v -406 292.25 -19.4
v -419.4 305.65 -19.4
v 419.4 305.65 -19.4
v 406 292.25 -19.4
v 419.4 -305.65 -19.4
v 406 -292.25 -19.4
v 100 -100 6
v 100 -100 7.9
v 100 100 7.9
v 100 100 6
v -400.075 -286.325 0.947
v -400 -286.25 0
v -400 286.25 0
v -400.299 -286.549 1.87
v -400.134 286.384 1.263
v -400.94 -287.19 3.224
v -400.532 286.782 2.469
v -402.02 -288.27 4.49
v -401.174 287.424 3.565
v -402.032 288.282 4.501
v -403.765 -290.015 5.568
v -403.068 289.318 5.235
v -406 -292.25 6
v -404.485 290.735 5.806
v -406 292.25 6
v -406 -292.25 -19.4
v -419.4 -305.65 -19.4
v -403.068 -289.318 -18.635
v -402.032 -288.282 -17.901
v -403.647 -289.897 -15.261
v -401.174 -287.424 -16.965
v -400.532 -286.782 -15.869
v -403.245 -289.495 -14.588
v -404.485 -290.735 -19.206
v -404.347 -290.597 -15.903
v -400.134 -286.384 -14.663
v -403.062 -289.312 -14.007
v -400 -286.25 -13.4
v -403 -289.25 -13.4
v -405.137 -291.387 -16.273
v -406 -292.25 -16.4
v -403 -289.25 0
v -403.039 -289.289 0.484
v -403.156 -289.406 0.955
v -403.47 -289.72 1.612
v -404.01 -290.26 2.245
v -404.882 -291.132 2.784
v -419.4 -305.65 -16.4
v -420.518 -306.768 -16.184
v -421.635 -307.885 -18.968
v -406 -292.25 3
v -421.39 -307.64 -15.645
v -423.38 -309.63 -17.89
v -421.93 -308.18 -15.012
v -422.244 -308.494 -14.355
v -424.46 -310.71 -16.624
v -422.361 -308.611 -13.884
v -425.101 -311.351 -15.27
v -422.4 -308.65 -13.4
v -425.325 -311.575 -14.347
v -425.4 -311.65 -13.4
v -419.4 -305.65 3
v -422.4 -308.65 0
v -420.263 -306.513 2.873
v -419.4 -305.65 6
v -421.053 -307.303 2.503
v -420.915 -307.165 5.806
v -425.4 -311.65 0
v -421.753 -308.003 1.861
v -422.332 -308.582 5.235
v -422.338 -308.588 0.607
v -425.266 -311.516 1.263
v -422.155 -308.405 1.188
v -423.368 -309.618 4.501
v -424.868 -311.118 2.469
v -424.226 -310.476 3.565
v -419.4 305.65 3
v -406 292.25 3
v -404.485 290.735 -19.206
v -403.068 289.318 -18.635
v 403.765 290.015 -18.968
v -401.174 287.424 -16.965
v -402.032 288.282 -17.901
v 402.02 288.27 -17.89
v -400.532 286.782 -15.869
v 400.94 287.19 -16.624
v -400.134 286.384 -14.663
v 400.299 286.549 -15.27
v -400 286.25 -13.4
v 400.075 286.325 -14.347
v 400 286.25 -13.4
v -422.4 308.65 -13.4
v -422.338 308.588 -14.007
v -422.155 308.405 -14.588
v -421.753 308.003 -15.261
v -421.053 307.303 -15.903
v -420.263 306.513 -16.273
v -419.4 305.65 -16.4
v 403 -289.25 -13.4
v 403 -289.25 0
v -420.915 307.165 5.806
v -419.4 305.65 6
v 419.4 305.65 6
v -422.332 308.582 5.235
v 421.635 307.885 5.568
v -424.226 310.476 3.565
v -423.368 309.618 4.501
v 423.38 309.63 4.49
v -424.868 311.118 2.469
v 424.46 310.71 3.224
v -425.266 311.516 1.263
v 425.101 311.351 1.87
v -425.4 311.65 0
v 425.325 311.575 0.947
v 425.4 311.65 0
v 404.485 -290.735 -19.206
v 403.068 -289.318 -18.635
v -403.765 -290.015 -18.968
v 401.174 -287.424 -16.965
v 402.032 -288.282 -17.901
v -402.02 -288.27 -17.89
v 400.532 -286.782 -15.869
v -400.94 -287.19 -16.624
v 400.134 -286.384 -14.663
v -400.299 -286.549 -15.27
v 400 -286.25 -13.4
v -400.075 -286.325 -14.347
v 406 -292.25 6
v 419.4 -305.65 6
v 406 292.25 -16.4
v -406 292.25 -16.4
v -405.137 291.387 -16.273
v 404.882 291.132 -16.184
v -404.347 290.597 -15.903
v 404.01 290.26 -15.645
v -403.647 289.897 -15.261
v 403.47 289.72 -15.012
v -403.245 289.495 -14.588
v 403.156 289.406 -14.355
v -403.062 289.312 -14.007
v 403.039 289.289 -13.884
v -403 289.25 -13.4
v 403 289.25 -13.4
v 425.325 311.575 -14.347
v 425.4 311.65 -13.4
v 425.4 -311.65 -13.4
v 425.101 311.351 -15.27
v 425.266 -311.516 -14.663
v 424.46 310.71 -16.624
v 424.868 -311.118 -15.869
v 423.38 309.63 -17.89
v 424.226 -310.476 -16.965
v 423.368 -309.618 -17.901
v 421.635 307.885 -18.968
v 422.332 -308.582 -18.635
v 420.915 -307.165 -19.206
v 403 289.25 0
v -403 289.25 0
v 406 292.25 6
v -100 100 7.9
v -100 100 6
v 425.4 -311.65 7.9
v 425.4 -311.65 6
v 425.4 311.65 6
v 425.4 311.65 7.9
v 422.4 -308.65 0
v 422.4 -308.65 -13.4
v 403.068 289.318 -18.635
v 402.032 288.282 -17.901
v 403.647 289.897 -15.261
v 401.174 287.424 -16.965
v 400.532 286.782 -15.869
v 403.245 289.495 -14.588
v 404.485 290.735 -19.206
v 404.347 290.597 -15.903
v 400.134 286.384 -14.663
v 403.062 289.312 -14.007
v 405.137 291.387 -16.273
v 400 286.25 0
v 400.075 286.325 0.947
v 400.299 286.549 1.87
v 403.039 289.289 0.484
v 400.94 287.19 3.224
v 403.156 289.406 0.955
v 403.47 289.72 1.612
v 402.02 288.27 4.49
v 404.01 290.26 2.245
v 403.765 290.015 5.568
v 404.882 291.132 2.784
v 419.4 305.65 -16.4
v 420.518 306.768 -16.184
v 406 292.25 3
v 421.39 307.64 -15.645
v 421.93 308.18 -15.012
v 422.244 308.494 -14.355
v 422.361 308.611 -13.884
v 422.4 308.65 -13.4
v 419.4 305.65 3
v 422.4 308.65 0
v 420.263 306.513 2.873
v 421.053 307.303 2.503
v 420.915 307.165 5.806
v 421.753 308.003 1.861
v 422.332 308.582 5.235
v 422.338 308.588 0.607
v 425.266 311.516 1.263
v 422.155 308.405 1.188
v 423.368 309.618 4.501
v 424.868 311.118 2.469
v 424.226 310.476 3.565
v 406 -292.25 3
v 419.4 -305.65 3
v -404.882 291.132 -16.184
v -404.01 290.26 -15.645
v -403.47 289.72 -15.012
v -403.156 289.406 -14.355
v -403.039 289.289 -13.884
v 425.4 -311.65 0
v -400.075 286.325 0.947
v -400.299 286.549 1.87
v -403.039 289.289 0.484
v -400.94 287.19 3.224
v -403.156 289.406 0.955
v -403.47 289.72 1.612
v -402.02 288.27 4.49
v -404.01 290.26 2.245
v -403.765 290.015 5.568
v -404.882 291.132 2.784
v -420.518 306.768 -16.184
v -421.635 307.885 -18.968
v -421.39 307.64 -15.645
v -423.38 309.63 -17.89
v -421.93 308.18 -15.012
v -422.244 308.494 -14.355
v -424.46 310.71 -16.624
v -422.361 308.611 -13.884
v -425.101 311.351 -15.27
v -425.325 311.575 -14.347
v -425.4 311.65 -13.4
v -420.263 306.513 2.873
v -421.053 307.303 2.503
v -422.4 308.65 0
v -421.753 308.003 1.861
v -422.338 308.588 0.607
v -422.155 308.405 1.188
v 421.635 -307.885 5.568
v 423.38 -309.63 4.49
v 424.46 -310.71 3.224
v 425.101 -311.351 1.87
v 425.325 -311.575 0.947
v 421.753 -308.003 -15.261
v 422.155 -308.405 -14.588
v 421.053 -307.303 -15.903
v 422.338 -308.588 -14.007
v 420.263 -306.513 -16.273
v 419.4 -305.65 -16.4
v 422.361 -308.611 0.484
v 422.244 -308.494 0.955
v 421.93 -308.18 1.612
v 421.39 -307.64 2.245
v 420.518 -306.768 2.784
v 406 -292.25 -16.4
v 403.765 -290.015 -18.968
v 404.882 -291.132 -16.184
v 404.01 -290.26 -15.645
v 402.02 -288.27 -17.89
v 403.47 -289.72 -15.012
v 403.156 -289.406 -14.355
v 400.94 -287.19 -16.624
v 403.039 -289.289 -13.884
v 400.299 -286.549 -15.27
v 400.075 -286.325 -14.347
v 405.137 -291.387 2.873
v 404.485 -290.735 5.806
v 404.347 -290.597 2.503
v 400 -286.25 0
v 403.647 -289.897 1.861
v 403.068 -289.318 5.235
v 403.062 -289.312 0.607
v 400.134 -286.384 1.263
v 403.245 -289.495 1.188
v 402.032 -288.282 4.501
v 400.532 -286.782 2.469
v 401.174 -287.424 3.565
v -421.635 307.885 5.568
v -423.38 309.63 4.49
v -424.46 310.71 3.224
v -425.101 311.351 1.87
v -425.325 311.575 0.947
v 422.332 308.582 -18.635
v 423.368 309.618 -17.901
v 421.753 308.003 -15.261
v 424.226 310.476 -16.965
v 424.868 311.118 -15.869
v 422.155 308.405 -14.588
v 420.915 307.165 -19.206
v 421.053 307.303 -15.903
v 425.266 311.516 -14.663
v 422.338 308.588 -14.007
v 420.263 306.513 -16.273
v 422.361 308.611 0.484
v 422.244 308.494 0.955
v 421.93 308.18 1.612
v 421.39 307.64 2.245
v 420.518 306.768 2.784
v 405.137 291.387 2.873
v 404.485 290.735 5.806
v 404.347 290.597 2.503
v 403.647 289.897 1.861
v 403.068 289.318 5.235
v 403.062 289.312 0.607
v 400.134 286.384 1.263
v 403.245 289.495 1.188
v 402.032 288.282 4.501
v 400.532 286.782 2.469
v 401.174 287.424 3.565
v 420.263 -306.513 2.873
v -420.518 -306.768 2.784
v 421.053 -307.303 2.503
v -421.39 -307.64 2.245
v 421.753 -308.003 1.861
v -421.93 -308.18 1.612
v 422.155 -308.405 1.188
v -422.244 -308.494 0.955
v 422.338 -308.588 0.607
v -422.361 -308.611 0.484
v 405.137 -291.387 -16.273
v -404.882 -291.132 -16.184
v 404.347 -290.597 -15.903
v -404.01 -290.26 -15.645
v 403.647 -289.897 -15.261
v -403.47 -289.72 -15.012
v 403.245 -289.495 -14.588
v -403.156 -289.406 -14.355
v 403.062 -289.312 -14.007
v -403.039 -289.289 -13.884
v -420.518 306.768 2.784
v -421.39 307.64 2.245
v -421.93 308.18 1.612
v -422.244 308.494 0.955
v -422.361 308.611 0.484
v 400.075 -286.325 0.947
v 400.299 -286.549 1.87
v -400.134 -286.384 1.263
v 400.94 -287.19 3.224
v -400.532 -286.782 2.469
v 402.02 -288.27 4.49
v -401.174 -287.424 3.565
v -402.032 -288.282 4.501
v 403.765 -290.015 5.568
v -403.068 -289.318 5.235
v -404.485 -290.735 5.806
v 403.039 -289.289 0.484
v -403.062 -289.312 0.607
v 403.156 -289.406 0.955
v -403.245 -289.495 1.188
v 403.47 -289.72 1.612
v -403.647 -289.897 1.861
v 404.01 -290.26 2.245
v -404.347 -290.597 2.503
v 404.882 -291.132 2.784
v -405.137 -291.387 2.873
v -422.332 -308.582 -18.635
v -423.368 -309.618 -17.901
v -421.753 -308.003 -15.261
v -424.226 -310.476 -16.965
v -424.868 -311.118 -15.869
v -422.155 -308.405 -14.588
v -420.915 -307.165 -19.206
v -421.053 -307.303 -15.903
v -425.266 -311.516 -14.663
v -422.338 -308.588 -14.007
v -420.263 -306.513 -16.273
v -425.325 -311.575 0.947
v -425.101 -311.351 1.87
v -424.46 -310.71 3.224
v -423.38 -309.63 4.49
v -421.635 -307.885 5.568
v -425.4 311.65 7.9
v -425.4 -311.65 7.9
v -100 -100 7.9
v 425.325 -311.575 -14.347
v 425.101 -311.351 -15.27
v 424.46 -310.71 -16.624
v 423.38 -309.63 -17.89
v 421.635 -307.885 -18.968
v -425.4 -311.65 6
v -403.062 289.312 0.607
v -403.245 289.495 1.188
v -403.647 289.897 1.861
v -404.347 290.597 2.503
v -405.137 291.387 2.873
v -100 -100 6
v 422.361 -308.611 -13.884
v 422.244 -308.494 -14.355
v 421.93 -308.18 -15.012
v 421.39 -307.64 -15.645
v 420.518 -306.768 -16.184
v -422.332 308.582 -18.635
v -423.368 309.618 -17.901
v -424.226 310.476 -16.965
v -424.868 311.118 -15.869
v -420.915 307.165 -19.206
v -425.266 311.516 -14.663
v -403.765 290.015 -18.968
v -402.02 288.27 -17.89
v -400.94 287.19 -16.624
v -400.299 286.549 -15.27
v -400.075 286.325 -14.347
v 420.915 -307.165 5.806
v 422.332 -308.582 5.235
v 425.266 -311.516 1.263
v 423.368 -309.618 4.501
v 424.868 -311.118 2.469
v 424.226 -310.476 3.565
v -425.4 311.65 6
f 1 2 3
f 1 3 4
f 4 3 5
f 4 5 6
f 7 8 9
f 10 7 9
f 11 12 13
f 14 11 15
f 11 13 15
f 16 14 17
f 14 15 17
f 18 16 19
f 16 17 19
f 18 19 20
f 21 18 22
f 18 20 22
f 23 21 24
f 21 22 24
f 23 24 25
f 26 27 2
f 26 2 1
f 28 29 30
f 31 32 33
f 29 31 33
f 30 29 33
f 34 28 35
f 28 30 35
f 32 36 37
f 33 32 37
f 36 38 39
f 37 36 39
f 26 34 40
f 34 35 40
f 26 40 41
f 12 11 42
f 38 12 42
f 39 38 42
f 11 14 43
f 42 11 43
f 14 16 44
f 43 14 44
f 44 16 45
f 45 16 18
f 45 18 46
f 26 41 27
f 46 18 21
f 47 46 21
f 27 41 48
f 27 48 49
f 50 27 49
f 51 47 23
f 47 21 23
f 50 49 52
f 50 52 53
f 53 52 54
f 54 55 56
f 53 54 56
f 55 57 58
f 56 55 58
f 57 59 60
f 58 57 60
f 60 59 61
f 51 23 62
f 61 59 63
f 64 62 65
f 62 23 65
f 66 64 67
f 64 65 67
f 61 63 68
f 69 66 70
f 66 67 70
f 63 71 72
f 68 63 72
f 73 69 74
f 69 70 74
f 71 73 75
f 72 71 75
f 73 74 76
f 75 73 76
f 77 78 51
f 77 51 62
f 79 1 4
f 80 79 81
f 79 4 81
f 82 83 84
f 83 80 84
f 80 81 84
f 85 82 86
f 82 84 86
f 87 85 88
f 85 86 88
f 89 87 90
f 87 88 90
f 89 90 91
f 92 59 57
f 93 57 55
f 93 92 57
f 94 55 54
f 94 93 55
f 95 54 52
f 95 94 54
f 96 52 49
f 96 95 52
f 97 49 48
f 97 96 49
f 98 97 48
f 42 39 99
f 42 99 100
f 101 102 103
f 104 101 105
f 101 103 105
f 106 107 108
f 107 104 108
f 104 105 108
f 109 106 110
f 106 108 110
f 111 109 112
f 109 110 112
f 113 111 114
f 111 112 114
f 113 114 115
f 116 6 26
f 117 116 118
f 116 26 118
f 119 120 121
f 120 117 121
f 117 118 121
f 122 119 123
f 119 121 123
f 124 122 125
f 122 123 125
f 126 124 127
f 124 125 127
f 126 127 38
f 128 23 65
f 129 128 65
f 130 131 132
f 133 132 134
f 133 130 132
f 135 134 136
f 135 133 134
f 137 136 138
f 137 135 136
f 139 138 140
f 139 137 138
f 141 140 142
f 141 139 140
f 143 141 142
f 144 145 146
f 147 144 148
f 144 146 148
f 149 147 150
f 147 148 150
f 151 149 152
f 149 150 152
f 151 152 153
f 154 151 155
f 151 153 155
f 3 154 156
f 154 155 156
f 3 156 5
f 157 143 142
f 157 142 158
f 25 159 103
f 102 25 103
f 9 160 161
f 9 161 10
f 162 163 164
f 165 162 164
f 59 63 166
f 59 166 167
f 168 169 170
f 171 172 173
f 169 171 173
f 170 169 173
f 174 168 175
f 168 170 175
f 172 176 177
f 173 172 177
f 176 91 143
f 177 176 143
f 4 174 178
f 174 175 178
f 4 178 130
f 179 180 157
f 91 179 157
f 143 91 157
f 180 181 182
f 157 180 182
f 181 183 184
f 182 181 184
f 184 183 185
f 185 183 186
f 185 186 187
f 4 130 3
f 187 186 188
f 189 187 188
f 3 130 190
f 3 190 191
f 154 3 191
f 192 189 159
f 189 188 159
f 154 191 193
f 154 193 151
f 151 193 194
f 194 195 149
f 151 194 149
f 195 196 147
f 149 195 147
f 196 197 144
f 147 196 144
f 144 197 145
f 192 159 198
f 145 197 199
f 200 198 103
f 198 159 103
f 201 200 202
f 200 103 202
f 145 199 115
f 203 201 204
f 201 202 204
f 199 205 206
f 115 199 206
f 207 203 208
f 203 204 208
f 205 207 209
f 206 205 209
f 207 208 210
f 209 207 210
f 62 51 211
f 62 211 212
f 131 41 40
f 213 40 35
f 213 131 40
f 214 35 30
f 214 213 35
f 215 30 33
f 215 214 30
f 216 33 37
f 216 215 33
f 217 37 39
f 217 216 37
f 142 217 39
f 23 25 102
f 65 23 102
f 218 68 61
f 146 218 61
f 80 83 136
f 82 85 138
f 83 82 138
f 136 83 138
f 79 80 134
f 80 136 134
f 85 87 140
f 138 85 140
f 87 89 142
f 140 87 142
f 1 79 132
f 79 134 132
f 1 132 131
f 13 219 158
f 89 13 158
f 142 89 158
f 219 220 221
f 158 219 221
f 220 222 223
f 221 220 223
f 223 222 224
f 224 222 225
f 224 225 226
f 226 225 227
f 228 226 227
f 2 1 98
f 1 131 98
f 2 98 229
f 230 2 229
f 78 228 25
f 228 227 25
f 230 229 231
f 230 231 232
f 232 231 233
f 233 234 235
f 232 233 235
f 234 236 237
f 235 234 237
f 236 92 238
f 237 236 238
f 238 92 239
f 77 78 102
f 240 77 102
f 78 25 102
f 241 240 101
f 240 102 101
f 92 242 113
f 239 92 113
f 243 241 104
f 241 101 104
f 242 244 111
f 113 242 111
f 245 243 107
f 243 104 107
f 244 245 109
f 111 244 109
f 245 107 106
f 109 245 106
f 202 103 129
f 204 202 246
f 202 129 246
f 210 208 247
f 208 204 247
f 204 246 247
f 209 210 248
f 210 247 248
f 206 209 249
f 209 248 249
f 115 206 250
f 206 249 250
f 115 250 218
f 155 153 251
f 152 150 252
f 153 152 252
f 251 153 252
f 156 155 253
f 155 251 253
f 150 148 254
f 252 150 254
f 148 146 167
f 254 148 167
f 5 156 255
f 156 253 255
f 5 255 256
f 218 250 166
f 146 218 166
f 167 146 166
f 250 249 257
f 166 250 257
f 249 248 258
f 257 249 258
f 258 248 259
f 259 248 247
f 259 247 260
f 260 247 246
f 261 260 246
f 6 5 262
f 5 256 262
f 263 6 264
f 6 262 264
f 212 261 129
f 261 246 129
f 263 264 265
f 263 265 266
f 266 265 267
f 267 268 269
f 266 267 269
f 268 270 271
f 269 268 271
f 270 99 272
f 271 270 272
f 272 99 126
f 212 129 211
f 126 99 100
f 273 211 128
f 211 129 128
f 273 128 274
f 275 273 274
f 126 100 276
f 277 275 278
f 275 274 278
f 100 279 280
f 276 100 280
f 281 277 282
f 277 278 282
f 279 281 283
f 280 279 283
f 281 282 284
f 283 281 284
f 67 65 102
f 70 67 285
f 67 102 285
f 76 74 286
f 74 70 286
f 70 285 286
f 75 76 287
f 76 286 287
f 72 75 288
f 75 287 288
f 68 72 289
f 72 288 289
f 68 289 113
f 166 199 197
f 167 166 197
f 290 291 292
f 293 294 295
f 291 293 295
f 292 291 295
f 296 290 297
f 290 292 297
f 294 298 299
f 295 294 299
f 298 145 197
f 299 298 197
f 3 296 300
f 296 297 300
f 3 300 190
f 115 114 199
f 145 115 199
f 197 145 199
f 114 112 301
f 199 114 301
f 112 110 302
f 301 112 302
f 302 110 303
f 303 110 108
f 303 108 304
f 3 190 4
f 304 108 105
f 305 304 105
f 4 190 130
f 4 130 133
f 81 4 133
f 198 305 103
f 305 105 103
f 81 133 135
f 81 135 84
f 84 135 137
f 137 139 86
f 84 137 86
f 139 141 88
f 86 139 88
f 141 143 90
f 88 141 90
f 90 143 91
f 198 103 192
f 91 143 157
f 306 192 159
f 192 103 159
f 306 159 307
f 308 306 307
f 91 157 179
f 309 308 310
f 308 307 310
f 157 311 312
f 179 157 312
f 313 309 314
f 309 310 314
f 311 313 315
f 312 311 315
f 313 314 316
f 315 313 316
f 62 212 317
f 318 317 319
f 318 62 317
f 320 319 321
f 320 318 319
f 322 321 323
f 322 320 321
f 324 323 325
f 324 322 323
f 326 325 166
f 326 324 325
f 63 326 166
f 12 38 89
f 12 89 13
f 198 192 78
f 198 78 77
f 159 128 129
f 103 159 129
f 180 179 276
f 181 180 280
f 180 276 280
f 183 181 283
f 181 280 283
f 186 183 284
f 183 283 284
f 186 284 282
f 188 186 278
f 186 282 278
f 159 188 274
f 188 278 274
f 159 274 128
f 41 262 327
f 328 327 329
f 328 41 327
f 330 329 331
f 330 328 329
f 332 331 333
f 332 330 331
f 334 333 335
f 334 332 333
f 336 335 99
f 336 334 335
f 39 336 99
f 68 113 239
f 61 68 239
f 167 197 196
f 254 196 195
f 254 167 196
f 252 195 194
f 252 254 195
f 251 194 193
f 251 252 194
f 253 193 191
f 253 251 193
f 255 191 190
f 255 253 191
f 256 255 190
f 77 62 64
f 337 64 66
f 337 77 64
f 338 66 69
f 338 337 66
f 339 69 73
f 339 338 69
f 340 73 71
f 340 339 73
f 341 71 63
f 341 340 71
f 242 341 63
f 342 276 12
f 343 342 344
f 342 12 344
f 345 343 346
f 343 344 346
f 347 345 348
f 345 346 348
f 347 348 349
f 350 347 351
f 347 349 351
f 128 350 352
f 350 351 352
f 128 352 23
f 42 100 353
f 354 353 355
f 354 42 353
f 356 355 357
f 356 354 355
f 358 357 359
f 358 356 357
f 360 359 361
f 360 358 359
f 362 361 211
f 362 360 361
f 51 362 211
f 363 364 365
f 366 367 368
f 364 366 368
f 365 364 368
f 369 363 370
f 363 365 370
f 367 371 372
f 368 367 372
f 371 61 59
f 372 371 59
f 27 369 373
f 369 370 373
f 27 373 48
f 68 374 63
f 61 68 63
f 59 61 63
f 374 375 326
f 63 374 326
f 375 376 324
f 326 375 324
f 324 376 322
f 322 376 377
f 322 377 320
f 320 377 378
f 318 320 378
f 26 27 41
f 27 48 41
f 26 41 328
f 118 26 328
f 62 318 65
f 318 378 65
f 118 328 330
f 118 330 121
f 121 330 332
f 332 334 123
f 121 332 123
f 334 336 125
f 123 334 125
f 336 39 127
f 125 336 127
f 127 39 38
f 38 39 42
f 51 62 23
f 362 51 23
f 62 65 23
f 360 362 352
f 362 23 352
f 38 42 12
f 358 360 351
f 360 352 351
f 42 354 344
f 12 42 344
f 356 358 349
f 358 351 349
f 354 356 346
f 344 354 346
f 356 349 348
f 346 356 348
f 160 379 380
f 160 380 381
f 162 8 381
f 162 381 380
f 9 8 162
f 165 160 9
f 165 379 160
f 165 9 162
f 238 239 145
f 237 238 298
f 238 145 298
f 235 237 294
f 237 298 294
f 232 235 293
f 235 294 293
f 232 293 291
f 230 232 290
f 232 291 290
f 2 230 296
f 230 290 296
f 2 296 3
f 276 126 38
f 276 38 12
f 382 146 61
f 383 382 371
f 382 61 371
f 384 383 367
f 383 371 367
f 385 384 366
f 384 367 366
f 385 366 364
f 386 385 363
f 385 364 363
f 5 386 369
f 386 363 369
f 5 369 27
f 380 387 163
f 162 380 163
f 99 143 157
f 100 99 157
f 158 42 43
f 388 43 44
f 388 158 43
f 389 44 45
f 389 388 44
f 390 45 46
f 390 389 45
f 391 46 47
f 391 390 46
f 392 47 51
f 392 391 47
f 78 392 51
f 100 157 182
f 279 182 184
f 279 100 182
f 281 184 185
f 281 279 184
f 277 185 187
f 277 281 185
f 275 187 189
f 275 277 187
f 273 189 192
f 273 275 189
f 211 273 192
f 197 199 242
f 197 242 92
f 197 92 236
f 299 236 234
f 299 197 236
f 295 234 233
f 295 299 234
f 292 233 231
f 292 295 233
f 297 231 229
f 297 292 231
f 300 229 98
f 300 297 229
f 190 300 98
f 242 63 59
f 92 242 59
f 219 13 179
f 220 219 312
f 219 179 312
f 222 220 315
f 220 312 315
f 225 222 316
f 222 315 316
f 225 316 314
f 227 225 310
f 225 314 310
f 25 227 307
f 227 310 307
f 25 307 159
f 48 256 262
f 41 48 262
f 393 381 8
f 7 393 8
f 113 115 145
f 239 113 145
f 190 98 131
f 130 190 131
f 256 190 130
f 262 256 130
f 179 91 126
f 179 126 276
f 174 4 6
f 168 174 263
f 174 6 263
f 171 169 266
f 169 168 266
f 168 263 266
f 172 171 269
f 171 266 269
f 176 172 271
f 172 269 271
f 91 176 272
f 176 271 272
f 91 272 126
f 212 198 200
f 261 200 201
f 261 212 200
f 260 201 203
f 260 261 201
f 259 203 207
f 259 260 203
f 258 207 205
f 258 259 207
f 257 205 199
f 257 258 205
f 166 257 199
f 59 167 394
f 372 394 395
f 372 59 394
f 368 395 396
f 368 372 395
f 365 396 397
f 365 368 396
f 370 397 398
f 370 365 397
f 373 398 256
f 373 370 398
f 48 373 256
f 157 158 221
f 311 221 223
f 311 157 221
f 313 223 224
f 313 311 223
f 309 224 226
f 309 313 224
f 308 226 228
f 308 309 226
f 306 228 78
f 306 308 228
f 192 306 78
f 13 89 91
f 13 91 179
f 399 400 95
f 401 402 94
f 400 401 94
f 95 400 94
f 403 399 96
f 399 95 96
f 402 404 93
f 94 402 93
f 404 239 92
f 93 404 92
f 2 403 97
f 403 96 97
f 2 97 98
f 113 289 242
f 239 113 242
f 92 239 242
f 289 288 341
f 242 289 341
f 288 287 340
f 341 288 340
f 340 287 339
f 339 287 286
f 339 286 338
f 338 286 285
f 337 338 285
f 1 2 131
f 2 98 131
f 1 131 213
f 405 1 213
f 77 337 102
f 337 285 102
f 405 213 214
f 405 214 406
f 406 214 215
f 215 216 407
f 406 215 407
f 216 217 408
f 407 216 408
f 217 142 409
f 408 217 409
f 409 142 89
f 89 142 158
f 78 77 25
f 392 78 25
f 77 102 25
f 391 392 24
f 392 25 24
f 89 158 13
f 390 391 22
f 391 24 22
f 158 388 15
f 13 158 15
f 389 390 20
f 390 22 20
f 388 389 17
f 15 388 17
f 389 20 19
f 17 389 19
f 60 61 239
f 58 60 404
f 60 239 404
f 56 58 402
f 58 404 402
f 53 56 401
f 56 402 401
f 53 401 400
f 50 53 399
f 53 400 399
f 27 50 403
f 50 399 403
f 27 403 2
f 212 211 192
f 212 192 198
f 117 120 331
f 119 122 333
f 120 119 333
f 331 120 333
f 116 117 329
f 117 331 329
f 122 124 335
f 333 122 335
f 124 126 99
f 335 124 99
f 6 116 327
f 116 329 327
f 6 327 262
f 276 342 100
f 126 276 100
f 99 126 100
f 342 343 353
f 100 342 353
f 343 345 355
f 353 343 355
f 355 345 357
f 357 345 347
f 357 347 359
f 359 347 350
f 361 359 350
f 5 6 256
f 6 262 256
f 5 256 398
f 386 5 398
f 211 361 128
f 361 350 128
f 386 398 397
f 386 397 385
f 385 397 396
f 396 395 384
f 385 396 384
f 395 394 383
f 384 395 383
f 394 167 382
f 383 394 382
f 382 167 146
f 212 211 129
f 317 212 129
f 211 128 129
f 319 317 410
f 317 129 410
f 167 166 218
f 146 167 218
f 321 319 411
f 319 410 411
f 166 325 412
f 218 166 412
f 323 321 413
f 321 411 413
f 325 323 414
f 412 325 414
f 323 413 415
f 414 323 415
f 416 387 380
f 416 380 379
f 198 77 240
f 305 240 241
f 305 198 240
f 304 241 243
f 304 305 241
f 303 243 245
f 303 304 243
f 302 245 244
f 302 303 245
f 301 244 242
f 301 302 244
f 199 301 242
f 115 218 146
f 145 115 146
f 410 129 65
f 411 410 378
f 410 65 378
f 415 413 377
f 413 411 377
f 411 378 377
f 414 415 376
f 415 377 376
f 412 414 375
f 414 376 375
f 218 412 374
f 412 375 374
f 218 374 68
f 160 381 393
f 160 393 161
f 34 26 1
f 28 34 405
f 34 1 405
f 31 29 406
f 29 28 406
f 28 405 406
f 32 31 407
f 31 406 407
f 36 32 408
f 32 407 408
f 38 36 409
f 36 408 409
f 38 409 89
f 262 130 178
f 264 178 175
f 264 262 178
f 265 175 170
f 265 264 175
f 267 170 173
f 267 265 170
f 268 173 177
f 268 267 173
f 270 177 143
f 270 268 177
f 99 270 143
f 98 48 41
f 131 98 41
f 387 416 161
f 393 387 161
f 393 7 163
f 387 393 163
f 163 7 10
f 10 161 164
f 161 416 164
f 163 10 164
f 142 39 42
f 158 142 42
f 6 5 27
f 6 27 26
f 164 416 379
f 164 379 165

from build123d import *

# Parameters (mm, degrees)
TUBO_CUADRADO_2_X_2_X_0_25_1_DEPTH      = 605.819481564
TUBO_CUADRADO_2_X_2_X_0_25_1_DEPTH_BACK = 33.319481564
TUBO_CUADRADO_2_X_2_X_0_25_1_2_DEPTH    = 866.638963129
TUBO_CUADRADO_2_X_2_X_0_25_1_3_DEPTH    = 639.138963129
TUBO_CUADRADO_2_X_2_X_0_25_1_4_DEPTH    = 866.638963129
CROQUIS3_W                              = 850.8
CROQUIS3_H                              = 623.3
SALIENTE_EXTRUIR1_DEPTH                 = 1.9
CROQUIS4_W                              = 200
CROQUIS4_H                              = 200
CORTAR_EXTRUIR2_DEPTH                   = 10


with BuildPart() as part:
    # Sketch1 → Tubo cuadrado 2 X 2 X 0.25(1) (new, two sides: drawn at the far end of the back side and taken through both)
    with BuildSketch(Plane(origin=(-412.7, 286.25, -6.7), x_dir=(1, 0, 0), z_dir=(0, -1, 0)).offset(-TUBO_CUADRADO_2_X_2_X_0_25_1_DEPTH_BACK)):
        with BuildLine():
            Line((-6.7, -12.7), (6.7, -12.7))
            ThreePointArc((6.7, -12.7), (10.942640687, -10.942640687), (12.7, -6.7))
            Line((12.7, -6.7), (12.7, 6.7))
            ThreePointArc((12.7, 6.7), (10.942640687, 10.942640687), (6.7, 12.7))
            Line((6.7, 12.7), (-6.7, 12.7))
            ThreePointArc((-6.7, 12.7), (-10.942640687, 10.942640687), (-12.7, 6.7))
            Line((-12.7, 6.7), (-12.7, -6.7))
            ThreePointArc((-12.7, -6.7), (-10.942640687, -10.942640687), (-6.7, -12.7))
        make_face()
        with BuildLine():
            Line((-6.7, -9.7), (6.7, -9.7))
            ThreePointArc((6.7, -9.7), (8.821320344, -8.821320344), (9.7, -6.7))
            Line((9.7, -6.7), (9.7, 6.7))
            ThreePointArc((9.7, 6.7), (8.821320344, 8.821320344), (6.7, 9.7))
            Line((6.7, 9.7), (-6.7, 9.7))
            ThreePointArc((-6.7, 9.7), (-8.821320344, 8.821320344), (-9.7, 6.7))
            Line((-9.7, 6.7), (-9.7, -6.7))
            ThreePointArc((-9.7, -6.7), (-8.821320344, -8.821320344), (-6.7, -9.7))
        make_face(mode=Mode.SUBTRACT)
    extrude(amount=TUBO_CUADRADO_2_X_2_X_0_25_1_DEPTH + TUBO_CUADRADO_2_X_2_X_0_25_1_DEPTH_BACK)

    # Tubo cuadrado 2 X 2 X 0.25(1) mitre 1
    split(bisect_by=Plane(origin=(-400, 286.25, 0), x_dir=(0.707106781, -0.707106781, 0), z_dir=(-0.707106781, -0.707106781, 0)), keep=Keep.TOP)

    # Tubo cuadrado 2 X 2 X 0.25(1) mitre 2
    split(bisect_by=Plane(origin=(-400, -286.25, 0), x_dir=(-0.707106781, -0.707106781, 0), z_dir=(-0.707106781, 0.707106781, 0)), keep=Keep.TOP)


with BuildPart() as body_2:
    # Sketch1 on segment 2 (carried to segment 2) → Tubo cuadrado 2 X 2 X 0.25_1 2 (new body)
    with BuildSketch(Plane(origin=(-433.319481564, -298.95, -6.7), x_dir=(0, 1, 0), z_dir=(1, 0, 0))):
        with BuildLine():
            Line((-6.7, -12.7), (6.7, -12.7))
            ThreePointArc((6.7, -12.7), (10.942640687, -10.942640687), (12.7, -6.7))
            Line((12.7, -6.7), (12.7, 6.7))
            ThreePointArc((12.7, 6.7), (10.942640687, 10.942640687), (6.7, 12.7))
            Line((6.7, 12.7), (-6.7, 12.7))
            ThreePointArc((-6.7, 12.7), (-10.942640687, 10.942640687), (-12.7, 6.7))
            Line((-12.7, 6.7), (-12.7, -6.7))
            ThreePointArc((-12.7, -6.7), (-10.942640687, -10.942640687), (-6.7, -12.7))
        make_face()
        with BuildLine():
            Line((-6.7, -9.7), (6.7, -9.7))
            ThreePointArc((6.7, -9.7), (8.821320344, -8.821320344), (9.7, -6.7))
            Line((9.7, -6.7), (9.7, 6.7))
            ThreePointArc((9.7, 6.7), (8.821320344, 8.821320344), (6.7, 9.7))
            Line((6.7, 9.7), (-6.7, 9.7))
            ThreePointArc((-6.7, 9.7), (-8.821320344, 8.821320344), (-9.7, 6.7))
            Line((-9.7, 6.7), (-9.7, -6.7))
            ThreePointArc((-9.7, -6.7), (-8.821320344, -8.821320344), (-6.7, -9.7))
        make_face(mode=Mode.SUBTRACT)
    extrude(amount=TUBO_CUADRADO_2_X_2_X_0_25_1_2_DEPTH)

    # Tubo cuadrado 2 X 2 X 0.25_1 2 mitre 1
    split(bisect_by=Plane(origin=(-400, -286.25, 0), x_dir=(0.707106781, 0.707106781, 0), z_dir=(0.707106781, -0.707106781, 0)), keep=Keep.TOP)

    # Tubo cuadrado 2 X 2 X 0.25_1 2 mitre 2
    split(bisect_by=Plane(origin=(400, -286.25, 0), x_dir=(0.707106781, -0.707106781, 0), z_dir=(-0.707106781, -0.707106781, 0)), keep=Keep.TOP)


with BuildPart() as body_3:
    # Sketch1 on segment 3 (carried to segment 3) → Tubo cuadrado 2 X 2 X 0.25_1 3 (new body)
    with BuildSketch(Plane(origin=(412.7, -319.569481564, -6.7), x_dir=(-1, 0, 0), z_dir=(0, 1, 0))):
        with BuildLine():
            Line((-6.7, -12.7), (6.7, -12.7))
            ThreePointArc((6.7, -12.7), (10.942640687, -10.942640687), (12.7, -6.7))
            Line((12.7, -6.7), (12.7, 6.7))
            ThreePointArc((12.7, 6.7), (10.942640687, 10.942640687), (6.7, 12.7))
            Line((6.7, 12.7), (-6.7, 12.7))
            ThreePointArc((-6.7, 12.7), (-10.942640687, 10.942640687), (-12.7, 6.7))
            Line((-12.7, 6.7), (-12.7, -6.7))
            ThreePointArc((-12.7, -6.7), (-10.942640687, -10.942640687), (-6.7, -12.7))
        make_face()
        with BuildLine():
            Line((-6.7, -9.7), (6.7, -9.7))
            ThreePointArc((6.7, -9.7), (8.821320344, -8.821320344), (9.7, -6.7))
            Line((9.7, -6.7), (9.7, 6.7))
            ThreePointArc((9.7, 6.7), (8.821320344, 8.821320344), (6.7, 9.7))
            Line((6.7, 9.7), (-6.7, 9.7))
            ThreePointArc((-6.7, 9.7), (-8.821320344, 8.821320344), (-9.7, 6.7))
            Line((-9.7, 6.7), (-9.7, -6.7))
            ThreePointArc((-9.7, -6.7), (-8.821320344, -8.821320344), (-6.7, -9.7))
        make_face(mode=Mode.SUBTRACT)
    extrude(amount=TUBO_CUADRADO_2_X_2_X_0_25_1_3_DEPTH)

    # Tubo cuadrado 2 X 2 X 0.25_1 3 mitre 1
    split(bisect_by=Plane(origin=(400, 286.25, 0), x_dir=(0.707106781, 0.707106781, 0), z_dir=(0.707106781, -0.707106781, 0)), keep=Keep.TOP)

    # Tubo cuadrado 2 X 2 X 0.25_1 3 mitre 2
    split(bisect_by=Plane(origin=(400, -286.25, 0), x_dir=(-0.707106781, 0.707106781, 0), z_dir=(0.707106781, 0.707106781, 0)), keep=Keep.TOP)


with BuildPart() as body_4:
    # Sketch1 on segment 4 (carried to segment 4) → Tubo cuadrado 2 X 2 X 0.25_1 4 (new body)
    with BuildSketch(Plane(origin=(433.319481564, 298.95, -6.7), x_dir=(0, -1, 0), z_dir=(-1, 0, 0))):
        with BuildLine():
            Line((-6.7, -12.7), (6.7, -12.7))
            ThreePointArc((6.7, -12.7), (10.942640687, -10.942640687), (12.7, -6.7))
            Line((12.7, -6.7), (12.7, 6.7))
            ThreePointArc((12.7, 6.7), (10.942640687, 10.942640687), (6.7, 12.7))
            Line((6.7, 12.7), (-6.7, 12.7))
            ThreePointArc((-6.7, 12.7), (-10.942640687, 10.942640687), (-12.7, 6.7))
            Line((-12.7, 6.7), (-12.7, -6.7))
            ThreePointArc((-12.7, -6.7), (-10.942640687, -10.942640687), (-6.7, -12.7))
        make_face()
        with BuildLine():
            Line((-6.7, -9.7), (6.7, -9.7))
            ThreePointArc((6.7, -9.7), (8.821320344, -8.821320344), (9.7, -6.7))
            Line((9.7, -6.7), (9.7, 6.7))
            ThreePointArc((9.7, 6.7), (8.821320344, 8.821320344), (6.7, 9.7))
            Line((6.7, 9.7), (-6.7, 9.7))
            ThreePointArc((-6.7, 9.7), (-8.821320344, 8.821320344), (-9.7, 6.7))
            Line((-9.7, 6.7), (-9.7, -6.7))
            ThreePointArc((-9.7, -6.7), (-8.821320344, -8.821320344), (-6.7, -9.7))
        make_face(mode=Mode.SUBTRACT)
    extrude(amount=TUBO_CUADRADO_2_X_2_X_0_25_1_4_DEPTH)

    # Tubo cuadrado 2 X 2 X 0.25_1 4 mitre 1
    split(bisect_by=Plane(origin=(-400, 286.25, 0), x_dir=(-0.707106781, 0.707106781, 0), z_dir=(0.707106781, 0.707106781, 0)), keep=Keep.TOP)

    # Tubo cuadrado 2 X 2 X 0.25_1 4 mitre 2
    split(bisect_by=Plane(origin=(400, 286.25, 0), x_dir=(-0.707106781, -0.707106781, 0), z_dir=(-0.707106781, 0.707106781, 0)), keep=Keep.TOP)


with BuildPart() as body_5:
    # Croquis3 → Saliente-Extruir1 (new body)
    with BuildSketch(Plane.XY.offset(6)):
        Rectangle(CROQUIS3_W, CROQUIS3_H)
    extrude(amount=SALIENTE_EXTRUIR1_DEPTH)

    # Croquis4 → Cortar-Extruir2 (cut)
    with BuildSketch(Plane.XY.offset(7.9)):
        Rectangle(CROQUIS4_W, CROQUIS4_H)
    extrude(amount=-CORTAR_EXTRUIR2_DEPTH, mode=Mode.SUBTRACT)


solid = Compound([part.part, body_2.part, body_3.part, body_4.part, body_5.part])
